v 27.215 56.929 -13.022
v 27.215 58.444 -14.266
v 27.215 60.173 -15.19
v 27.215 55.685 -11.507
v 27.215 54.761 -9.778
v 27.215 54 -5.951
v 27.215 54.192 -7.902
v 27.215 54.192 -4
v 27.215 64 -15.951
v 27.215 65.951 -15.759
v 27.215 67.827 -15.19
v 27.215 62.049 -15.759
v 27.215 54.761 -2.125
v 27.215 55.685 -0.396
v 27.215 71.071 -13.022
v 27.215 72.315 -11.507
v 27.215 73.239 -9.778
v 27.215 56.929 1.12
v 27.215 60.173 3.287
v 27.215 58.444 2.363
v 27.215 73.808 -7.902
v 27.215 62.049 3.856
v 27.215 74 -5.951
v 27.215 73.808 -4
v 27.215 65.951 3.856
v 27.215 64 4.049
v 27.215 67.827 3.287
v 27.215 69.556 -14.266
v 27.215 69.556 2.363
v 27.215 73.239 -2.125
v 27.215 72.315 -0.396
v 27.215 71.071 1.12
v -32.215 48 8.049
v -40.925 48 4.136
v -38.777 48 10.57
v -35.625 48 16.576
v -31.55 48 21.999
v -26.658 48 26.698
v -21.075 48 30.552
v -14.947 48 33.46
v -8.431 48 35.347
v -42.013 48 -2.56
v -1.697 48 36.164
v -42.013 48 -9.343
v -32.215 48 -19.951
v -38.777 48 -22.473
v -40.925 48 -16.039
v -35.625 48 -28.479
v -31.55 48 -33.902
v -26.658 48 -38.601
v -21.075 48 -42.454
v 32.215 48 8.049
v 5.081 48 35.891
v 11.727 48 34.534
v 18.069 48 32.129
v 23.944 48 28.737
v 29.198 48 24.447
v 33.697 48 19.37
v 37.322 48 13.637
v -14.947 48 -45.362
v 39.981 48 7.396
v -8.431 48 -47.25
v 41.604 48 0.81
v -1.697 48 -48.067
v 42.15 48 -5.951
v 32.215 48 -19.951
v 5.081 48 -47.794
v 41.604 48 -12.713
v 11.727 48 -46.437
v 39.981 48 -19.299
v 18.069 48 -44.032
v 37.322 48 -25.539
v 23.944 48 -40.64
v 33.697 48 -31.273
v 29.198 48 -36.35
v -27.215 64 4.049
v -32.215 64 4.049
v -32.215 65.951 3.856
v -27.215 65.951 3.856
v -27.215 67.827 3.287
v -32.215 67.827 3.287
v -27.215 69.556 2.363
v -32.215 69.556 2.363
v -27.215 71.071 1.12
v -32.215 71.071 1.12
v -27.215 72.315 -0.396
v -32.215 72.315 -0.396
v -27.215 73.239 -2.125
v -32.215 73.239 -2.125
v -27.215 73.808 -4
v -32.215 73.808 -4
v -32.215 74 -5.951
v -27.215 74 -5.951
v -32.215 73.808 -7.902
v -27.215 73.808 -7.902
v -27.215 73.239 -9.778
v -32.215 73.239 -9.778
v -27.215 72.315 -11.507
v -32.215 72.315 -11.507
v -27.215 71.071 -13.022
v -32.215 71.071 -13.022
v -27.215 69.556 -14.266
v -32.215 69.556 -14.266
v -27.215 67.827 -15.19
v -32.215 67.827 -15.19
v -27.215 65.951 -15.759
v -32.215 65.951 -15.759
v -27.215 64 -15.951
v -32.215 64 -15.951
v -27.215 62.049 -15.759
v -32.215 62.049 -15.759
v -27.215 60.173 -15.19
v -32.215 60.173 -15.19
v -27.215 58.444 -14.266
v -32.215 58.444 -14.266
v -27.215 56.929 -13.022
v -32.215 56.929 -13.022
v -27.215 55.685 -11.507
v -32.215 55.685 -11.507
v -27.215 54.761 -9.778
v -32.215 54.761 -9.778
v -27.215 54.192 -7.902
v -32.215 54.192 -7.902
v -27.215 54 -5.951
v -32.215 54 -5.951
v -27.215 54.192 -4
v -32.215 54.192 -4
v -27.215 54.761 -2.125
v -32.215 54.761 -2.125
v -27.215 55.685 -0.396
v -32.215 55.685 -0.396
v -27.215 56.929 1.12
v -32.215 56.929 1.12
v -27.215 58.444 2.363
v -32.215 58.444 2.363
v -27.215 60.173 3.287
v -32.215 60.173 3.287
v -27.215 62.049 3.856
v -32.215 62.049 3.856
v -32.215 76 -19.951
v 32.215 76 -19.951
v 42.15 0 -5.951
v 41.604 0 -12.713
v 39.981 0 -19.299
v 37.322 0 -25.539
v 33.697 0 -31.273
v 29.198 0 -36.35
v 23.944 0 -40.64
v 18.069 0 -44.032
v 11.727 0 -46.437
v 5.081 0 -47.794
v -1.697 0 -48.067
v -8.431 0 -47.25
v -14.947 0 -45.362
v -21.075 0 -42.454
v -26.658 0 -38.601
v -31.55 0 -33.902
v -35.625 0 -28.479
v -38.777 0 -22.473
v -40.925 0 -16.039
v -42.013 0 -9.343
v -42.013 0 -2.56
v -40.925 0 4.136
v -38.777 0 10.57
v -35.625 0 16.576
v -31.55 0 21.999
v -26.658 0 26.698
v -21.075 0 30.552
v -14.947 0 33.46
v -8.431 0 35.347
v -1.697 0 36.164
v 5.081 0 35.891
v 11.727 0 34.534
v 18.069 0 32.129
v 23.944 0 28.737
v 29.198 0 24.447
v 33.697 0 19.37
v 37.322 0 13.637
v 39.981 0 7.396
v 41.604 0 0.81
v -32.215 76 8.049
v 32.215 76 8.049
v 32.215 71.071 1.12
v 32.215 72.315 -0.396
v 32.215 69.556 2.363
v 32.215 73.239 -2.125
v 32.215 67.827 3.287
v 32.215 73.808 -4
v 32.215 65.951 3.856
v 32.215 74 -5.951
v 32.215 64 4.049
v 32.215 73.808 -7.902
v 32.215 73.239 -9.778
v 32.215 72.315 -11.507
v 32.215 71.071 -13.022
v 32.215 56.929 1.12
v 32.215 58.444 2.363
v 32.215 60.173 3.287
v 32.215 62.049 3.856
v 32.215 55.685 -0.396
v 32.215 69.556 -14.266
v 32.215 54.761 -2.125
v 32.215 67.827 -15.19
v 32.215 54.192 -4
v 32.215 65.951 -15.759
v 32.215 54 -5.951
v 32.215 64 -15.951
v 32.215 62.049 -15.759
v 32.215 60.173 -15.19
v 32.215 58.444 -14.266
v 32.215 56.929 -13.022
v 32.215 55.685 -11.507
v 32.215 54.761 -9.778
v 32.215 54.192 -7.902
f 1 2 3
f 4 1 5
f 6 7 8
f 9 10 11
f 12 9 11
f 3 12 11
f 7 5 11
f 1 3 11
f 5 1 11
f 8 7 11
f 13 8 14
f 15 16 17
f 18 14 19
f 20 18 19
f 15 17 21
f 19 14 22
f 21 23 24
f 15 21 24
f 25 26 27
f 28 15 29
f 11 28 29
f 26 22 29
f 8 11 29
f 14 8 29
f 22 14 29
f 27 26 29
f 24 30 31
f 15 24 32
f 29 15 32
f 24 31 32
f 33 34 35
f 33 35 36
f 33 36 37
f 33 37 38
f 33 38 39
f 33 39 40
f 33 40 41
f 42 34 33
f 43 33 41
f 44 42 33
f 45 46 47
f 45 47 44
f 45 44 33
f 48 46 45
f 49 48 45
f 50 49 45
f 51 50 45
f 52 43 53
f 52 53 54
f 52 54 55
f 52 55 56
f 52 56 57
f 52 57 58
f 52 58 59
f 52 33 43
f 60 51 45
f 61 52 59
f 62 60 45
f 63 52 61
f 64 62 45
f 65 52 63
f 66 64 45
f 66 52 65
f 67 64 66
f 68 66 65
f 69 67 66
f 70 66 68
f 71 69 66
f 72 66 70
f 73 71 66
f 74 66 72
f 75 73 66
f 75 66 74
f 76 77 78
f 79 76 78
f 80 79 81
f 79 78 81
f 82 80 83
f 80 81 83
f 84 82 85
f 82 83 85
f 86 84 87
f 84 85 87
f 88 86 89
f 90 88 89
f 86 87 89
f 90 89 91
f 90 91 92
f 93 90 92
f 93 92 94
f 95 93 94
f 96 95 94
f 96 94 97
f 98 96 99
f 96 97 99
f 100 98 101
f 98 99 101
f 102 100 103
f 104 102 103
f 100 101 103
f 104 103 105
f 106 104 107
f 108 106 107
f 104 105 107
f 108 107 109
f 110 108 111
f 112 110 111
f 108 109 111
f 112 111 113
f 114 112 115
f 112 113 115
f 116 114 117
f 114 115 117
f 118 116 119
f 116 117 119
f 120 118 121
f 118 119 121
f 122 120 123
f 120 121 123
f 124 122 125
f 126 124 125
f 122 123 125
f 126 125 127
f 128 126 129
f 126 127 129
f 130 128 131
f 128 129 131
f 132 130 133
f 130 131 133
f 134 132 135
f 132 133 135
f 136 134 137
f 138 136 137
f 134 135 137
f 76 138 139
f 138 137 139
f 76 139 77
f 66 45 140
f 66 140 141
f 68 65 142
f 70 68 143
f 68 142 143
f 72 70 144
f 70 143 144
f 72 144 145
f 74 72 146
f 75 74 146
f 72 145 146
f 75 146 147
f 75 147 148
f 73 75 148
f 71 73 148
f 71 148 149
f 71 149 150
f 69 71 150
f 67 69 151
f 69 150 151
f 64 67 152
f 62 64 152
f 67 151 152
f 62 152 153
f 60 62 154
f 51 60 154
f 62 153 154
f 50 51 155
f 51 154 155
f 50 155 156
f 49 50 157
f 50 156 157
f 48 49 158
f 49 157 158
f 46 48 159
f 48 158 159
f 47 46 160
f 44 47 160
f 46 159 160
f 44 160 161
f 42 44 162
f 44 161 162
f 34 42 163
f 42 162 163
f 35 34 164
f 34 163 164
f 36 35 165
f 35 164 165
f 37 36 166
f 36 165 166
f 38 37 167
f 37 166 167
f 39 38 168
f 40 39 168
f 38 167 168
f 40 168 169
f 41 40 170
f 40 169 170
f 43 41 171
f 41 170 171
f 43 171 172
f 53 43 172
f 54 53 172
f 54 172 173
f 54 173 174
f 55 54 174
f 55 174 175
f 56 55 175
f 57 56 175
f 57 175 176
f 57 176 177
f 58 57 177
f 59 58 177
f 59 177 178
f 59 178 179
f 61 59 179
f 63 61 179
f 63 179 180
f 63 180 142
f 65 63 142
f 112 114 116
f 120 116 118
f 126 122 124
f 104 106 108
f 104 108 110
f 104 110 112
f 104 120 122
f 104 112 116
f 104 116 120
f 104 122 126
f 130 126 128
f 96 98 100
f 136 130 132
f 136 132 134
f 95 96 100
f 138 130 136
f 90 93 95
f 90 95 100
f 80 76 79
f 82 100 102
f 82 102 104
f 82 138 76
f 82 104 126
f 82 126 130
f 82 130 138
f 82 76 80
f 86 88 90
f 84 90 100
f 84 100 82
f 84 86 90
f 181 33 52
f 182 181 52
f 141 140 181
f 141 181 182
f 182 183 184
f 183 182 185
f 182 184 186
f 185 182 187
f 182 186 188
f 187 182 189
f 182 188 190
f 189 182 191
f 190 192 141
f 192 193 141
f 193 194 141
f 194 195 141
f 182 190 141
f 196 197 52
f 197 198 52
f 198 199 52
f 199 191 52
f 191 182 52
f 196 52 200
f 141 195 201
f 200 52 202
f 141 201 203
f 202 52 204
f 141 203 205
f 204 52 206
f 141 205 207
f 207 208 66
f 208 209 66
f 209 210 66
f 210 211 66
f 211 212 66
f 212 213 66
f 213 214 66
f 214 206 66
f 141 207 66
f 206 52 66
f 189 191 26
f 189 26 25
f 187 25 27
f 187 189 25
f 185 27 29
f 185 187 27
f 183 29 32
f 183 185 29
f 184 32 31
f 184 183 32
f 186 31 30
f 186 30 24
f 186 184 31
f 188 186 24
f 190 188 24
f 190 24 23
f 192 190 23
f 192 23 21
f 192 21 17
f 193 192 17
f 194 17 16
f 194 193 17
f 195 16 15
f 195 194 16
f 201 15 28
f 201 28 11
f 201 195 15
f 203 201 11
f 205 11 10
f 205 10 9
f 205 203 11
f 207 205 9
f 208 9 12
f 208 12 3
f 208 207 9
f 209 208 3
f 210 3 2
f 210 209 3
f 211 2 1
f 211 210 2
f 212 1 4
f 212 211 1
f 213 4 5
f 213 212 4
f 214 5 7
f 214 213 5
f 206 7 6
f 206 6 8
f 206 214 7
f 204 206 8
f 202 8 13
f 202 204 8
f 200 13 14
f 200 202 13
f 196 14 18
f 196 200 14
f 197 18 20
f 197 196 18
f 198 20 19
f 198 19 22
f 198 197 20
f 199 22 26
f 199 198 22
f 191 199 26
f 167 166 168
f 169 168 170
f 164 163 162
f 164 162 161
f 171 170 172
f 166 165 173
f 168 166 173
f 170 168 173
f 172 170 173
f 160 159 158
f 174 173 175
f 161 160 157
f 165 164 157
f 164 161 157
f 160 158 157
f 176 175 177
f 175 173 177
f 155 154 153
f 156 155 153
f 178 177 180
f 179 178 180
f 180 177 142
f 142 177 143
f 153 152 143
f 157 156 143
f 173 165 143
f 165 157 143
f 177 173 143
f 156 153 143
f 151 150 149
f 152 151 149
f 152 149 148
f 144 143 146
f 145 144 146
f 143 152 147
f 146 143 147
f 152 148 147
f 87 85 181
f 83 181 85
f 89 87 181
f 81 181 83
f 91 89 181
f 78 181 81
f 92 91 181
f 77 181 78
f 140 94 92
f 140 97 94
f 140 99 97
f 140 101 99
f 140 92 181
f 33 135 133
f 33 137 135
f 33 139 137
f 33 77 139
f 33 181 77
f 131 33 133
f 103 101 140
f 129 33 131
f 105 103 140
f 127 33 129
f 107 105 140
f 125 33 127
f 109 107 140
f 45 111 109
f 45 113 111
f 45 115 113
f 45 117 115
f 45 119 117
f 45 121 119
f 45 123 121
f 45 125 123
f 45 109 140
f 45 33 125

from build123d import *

# Parameters (mm, degrees)
SKETCH1_R           = 42.15
BOSS_EXTRUDE1_DEPTH = 48
SKETCH2_W           = 64.43
SKETCH2_H           = 28
BOSS_EXTRUDE2_DEPTH = 28
SKETCH3_R           = 10
CUT_EXTRUDE1_DEPTH  = 5


with BuildPart() as part:
    # Sketch1 → Boss-Extrude1 (new body)
    with BuildSketch(Plane(origin=(0, 0, 0), x_dir=(1, 0, 0), z_dir=(0, 1, 0))):
        with Locations((0, 5.951400749)):
            Circle(SKETCH1_R)
    extrude(amount=BOSS_EXTRUDE1_DEPTH)

    # Sketch2 → Boss-Extrude2 (add)
    with BuildSketch(Plane(origin=(0, 48, 0), x_dir=(1, 0, 0), z_dir=(0, 1, 0))):
        with Locations((0, 5.951400749)):
            Rectangle(SKETCH2_W, SKETCH2_H)
    extrude(amount=BOSS_EXTRUDE2_DEPTH)

    # Sketch3 → Cut-Extrude1 (cut)
    with BuildSketch(Plane.ZY.offset(32.215)):
        with Locations((-5.951400749, 64)):
            Circle(SKETCH3_R)
    cut_extrude1 = extrude(amount=-CUT_EXTRUDE1_DEPTH, mode=Mode.SUBTRACT)

    # Mirror2: Cut-Extrude1 across plane
    add(cut_extrude1.mirror(Plane.ZY), mode=Mode.SUBTRACT)


solid = part.part
